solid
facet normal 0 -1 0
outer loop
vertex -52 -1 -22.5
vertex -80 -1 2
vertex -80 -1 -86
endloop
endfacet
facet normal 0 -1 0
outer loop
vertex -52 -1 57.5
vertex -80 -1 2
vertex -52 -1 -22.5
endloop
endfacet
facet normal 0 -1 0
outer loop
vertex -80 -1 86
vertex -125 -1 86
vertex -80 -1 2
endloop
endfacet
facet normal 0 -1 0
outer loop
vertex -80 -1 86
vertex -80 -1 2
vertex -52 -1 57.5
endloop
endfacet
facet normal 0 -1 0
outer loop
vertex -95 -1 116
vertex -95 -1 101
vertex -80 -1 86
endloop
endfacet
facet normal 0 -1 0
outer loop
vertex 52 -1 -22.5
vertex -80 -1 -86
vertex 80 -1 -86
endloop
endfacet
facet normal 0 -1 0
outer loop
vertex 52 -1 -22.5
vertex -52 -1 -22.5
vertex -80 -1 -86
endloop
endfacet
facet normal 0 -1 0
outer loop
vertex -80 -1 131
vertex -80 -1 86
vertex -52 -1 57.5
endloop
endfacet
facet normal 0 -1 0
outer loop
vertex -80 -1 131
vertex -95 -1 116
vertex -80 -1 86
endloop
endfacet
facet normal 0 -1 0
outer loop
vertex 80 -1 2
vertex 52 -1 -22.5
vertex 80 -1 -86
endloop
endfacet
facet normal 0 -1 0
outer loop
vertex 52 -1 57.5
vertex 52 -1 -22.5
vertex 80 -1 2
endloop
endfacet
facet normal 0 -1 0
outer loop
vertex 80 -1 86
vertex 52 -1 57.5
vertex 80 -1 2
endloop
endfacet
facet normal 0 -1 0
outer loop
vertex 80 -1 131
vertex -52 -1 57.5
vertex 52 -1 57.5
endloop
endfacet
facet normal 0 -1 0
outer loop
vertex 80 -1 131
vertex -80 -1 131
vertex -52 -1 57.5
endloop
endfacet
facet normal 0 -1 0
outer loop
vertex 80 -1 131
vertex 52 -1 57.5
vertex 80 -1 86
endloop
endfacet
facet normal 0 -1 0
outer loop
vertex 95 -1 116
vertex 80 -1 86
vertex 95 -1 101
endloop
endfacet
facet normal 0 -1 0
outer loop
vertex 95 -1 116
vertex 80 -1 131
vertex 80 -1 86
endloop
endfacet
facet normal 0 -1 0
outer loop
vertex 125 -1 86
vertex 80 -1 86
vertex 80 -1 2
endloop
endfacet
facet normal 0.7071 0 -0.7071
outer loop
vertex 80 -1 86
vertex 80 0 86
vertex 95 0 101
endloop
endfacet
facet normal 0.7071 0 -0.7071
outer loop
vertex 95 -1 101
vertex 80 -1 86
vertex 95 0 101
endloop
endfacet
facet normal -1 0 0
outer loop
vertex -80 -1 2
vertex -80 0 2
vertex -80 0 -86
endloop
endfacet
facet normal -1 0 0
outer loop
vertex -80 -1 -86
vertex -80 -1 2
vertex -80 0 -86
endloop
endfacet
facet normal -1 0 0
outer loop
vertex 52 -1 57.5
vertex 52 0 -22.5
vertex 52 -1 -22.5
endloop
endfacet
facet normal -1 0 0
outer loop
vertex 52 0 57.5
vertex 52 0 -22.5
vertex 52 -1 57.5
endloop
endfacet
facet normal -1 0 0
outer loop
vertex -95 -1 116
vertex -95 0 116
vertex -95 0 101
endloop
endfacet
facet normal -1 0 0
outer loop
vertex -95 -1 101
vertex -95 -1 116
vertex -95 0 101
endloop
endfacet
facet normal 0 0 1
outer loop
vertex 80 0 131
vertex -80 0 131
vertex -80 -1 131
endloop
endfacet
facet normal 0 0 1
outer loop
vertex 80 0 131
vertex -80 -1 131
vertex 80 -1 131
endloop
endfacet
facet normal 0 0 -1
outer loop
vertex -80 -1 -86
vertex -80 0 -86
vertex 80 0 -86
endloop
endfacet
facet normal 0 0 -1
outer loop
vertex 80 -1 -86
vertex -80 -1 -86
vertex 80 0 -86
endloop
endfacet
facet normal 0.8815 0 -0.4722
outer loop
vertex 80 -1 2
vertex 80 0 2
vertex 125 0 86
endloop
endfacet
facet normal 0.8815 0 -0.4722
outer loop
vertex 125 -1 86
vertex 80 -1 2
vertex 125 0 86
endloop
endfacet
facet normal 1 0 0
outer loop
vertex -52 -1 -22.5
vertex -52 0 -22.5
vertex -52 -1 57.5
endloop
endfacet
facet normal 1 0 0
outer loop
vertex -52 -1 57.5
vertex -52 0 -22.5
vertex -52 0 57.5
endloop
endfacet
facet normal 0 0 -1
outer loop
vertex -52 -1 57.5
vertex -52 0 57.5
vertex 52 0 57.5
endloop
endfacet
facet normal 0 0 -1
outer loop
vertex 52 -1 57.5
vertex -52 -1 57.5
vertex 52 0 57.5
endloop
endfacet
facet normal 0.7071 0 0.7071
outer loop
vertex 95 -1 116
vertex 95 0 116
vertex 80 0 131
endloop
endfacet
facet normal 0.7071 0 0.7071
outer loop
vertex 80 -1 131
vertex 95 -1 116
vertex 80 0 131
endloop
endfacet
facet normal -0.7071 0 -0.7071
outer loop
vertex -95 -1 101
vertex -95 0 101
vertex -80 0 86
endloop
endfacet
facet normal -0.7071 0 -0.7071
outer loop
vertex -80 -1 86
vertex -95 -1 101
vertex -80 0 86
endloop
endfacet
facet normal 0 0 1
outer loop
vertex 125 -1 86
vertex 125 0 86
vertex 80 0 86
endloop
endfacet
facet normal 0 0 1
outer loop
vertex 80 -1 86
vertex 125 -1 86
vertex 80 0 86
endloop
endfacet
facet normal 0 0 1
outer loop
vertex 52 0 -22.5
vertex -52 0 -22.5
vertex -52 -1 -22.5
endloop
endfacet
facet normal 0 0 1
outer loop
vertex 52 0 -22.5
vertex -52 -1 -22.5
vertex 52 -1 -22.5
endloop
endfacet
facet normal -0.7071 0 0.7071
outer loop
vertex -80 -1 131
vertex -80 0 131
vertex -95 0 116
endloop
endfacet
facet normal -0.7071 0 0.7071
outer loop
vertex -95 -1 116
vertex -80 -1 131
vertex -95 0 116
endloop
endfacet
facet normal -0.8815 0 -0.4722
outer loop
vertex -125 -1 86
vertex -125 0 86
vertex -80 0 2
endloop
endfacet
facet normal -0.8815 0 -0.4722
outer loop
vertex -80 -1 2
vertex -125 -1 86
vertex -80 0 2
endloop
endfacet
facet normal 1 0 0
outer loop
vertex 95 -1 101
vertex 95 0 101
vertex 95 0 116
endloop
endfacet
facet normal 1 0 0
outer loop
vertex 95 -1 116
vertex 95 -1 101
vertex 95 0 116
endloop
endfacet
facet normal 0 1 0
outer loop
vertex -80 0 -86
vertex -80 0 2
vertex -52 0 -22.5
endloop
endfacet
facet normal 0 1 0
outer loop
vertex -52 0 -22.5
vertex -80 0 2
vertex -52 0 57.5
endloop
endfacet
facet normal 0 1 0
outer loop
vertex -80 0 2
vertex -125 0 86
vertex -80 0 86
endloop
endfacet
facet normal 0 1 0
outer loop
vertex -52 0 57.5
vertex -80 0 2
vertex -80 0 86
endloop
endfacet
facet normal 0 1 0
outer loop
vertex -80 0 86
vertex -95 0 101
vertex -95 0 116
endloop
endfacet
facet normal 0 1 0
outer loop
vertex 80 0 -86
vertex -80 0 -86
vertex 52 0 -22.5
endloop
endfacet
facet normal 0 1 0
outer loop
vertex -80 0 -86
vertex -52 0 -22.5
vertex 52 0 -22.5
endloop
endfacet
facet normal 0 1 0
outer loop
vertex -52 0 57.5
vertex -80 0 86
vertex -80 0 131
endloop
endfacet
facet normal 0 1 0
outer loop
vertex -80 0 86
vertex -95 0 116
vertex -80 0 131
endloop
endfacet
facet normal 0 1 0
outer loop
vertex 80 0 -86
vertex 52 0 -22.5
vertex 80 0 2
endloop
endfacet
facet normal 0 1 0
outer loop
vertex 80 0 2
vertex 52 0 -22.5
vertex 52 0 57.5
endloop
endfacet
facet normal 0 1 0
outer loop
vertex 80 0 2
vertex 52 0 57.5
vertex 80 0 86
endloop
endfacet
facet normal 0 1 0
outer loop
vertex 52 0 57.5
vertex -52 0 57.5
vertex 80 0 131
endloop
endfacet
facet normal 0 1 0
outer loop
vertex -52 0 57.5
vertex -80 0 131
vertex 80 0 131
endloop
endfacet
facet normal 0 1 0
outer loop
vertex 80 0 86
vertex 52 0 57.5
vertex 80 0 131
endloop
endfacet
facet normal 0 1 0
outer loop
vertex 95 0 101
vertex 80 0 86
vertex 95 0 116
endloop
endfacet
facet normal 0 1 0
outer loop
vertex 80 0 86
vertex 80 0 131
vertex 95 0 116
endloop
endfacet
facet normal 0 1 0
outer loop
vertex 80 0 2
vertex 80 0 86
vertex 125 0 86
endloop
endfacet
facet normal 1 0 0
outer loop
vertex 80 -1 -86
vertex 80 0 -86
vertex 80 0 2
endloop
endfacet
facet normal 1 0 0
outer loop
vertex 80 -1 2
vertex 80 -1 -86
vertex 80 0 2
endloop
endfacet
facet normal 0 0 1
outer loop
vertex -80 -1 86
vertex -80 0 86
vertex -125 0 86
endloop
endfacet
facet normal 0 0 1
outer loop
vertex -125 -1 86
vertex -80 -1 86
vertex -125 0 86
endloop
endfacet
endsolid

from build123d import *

# Parameters (mm, degrees)
F0_W     = 104
F0_H     = 80
F0_W_2   = 160
F0_H_2   = 45
F1_DEPTH = 1


with BuildPart() as f1:
    # F0 (on Front) → F1 (new body)
    with BuildSketch(Plane.XZ):
        Polygon((-80, 86), (-80, 2), (-80, -86), (-1.5, -86), (4.5, -86), (80, -86), (80, 2), (80, 86), align=None)
        with Locations((0, 17.5)):
            Rectangle(F0_W, F0_H, mode=Mode.SUBTRACT)
        Polygon((102.5, 86), (80, 86), (80, 2), (125, 86), align=None)
        with Locations((0, 108.5)):
            Rectangle(F0_W_2, F0_H_2)
        Polygon((-95, 101), (-80, 86), (-80, 131), (-95, 116), align=None)
        Polygon((-80, 86), (-125, 86), (-80, 2), align=None)
        Polygon((80, 131), (80, 86), (95, 101), (95, 116), align=None)
    extrude(amount=F1_DEPTH)


solid = f1.part
